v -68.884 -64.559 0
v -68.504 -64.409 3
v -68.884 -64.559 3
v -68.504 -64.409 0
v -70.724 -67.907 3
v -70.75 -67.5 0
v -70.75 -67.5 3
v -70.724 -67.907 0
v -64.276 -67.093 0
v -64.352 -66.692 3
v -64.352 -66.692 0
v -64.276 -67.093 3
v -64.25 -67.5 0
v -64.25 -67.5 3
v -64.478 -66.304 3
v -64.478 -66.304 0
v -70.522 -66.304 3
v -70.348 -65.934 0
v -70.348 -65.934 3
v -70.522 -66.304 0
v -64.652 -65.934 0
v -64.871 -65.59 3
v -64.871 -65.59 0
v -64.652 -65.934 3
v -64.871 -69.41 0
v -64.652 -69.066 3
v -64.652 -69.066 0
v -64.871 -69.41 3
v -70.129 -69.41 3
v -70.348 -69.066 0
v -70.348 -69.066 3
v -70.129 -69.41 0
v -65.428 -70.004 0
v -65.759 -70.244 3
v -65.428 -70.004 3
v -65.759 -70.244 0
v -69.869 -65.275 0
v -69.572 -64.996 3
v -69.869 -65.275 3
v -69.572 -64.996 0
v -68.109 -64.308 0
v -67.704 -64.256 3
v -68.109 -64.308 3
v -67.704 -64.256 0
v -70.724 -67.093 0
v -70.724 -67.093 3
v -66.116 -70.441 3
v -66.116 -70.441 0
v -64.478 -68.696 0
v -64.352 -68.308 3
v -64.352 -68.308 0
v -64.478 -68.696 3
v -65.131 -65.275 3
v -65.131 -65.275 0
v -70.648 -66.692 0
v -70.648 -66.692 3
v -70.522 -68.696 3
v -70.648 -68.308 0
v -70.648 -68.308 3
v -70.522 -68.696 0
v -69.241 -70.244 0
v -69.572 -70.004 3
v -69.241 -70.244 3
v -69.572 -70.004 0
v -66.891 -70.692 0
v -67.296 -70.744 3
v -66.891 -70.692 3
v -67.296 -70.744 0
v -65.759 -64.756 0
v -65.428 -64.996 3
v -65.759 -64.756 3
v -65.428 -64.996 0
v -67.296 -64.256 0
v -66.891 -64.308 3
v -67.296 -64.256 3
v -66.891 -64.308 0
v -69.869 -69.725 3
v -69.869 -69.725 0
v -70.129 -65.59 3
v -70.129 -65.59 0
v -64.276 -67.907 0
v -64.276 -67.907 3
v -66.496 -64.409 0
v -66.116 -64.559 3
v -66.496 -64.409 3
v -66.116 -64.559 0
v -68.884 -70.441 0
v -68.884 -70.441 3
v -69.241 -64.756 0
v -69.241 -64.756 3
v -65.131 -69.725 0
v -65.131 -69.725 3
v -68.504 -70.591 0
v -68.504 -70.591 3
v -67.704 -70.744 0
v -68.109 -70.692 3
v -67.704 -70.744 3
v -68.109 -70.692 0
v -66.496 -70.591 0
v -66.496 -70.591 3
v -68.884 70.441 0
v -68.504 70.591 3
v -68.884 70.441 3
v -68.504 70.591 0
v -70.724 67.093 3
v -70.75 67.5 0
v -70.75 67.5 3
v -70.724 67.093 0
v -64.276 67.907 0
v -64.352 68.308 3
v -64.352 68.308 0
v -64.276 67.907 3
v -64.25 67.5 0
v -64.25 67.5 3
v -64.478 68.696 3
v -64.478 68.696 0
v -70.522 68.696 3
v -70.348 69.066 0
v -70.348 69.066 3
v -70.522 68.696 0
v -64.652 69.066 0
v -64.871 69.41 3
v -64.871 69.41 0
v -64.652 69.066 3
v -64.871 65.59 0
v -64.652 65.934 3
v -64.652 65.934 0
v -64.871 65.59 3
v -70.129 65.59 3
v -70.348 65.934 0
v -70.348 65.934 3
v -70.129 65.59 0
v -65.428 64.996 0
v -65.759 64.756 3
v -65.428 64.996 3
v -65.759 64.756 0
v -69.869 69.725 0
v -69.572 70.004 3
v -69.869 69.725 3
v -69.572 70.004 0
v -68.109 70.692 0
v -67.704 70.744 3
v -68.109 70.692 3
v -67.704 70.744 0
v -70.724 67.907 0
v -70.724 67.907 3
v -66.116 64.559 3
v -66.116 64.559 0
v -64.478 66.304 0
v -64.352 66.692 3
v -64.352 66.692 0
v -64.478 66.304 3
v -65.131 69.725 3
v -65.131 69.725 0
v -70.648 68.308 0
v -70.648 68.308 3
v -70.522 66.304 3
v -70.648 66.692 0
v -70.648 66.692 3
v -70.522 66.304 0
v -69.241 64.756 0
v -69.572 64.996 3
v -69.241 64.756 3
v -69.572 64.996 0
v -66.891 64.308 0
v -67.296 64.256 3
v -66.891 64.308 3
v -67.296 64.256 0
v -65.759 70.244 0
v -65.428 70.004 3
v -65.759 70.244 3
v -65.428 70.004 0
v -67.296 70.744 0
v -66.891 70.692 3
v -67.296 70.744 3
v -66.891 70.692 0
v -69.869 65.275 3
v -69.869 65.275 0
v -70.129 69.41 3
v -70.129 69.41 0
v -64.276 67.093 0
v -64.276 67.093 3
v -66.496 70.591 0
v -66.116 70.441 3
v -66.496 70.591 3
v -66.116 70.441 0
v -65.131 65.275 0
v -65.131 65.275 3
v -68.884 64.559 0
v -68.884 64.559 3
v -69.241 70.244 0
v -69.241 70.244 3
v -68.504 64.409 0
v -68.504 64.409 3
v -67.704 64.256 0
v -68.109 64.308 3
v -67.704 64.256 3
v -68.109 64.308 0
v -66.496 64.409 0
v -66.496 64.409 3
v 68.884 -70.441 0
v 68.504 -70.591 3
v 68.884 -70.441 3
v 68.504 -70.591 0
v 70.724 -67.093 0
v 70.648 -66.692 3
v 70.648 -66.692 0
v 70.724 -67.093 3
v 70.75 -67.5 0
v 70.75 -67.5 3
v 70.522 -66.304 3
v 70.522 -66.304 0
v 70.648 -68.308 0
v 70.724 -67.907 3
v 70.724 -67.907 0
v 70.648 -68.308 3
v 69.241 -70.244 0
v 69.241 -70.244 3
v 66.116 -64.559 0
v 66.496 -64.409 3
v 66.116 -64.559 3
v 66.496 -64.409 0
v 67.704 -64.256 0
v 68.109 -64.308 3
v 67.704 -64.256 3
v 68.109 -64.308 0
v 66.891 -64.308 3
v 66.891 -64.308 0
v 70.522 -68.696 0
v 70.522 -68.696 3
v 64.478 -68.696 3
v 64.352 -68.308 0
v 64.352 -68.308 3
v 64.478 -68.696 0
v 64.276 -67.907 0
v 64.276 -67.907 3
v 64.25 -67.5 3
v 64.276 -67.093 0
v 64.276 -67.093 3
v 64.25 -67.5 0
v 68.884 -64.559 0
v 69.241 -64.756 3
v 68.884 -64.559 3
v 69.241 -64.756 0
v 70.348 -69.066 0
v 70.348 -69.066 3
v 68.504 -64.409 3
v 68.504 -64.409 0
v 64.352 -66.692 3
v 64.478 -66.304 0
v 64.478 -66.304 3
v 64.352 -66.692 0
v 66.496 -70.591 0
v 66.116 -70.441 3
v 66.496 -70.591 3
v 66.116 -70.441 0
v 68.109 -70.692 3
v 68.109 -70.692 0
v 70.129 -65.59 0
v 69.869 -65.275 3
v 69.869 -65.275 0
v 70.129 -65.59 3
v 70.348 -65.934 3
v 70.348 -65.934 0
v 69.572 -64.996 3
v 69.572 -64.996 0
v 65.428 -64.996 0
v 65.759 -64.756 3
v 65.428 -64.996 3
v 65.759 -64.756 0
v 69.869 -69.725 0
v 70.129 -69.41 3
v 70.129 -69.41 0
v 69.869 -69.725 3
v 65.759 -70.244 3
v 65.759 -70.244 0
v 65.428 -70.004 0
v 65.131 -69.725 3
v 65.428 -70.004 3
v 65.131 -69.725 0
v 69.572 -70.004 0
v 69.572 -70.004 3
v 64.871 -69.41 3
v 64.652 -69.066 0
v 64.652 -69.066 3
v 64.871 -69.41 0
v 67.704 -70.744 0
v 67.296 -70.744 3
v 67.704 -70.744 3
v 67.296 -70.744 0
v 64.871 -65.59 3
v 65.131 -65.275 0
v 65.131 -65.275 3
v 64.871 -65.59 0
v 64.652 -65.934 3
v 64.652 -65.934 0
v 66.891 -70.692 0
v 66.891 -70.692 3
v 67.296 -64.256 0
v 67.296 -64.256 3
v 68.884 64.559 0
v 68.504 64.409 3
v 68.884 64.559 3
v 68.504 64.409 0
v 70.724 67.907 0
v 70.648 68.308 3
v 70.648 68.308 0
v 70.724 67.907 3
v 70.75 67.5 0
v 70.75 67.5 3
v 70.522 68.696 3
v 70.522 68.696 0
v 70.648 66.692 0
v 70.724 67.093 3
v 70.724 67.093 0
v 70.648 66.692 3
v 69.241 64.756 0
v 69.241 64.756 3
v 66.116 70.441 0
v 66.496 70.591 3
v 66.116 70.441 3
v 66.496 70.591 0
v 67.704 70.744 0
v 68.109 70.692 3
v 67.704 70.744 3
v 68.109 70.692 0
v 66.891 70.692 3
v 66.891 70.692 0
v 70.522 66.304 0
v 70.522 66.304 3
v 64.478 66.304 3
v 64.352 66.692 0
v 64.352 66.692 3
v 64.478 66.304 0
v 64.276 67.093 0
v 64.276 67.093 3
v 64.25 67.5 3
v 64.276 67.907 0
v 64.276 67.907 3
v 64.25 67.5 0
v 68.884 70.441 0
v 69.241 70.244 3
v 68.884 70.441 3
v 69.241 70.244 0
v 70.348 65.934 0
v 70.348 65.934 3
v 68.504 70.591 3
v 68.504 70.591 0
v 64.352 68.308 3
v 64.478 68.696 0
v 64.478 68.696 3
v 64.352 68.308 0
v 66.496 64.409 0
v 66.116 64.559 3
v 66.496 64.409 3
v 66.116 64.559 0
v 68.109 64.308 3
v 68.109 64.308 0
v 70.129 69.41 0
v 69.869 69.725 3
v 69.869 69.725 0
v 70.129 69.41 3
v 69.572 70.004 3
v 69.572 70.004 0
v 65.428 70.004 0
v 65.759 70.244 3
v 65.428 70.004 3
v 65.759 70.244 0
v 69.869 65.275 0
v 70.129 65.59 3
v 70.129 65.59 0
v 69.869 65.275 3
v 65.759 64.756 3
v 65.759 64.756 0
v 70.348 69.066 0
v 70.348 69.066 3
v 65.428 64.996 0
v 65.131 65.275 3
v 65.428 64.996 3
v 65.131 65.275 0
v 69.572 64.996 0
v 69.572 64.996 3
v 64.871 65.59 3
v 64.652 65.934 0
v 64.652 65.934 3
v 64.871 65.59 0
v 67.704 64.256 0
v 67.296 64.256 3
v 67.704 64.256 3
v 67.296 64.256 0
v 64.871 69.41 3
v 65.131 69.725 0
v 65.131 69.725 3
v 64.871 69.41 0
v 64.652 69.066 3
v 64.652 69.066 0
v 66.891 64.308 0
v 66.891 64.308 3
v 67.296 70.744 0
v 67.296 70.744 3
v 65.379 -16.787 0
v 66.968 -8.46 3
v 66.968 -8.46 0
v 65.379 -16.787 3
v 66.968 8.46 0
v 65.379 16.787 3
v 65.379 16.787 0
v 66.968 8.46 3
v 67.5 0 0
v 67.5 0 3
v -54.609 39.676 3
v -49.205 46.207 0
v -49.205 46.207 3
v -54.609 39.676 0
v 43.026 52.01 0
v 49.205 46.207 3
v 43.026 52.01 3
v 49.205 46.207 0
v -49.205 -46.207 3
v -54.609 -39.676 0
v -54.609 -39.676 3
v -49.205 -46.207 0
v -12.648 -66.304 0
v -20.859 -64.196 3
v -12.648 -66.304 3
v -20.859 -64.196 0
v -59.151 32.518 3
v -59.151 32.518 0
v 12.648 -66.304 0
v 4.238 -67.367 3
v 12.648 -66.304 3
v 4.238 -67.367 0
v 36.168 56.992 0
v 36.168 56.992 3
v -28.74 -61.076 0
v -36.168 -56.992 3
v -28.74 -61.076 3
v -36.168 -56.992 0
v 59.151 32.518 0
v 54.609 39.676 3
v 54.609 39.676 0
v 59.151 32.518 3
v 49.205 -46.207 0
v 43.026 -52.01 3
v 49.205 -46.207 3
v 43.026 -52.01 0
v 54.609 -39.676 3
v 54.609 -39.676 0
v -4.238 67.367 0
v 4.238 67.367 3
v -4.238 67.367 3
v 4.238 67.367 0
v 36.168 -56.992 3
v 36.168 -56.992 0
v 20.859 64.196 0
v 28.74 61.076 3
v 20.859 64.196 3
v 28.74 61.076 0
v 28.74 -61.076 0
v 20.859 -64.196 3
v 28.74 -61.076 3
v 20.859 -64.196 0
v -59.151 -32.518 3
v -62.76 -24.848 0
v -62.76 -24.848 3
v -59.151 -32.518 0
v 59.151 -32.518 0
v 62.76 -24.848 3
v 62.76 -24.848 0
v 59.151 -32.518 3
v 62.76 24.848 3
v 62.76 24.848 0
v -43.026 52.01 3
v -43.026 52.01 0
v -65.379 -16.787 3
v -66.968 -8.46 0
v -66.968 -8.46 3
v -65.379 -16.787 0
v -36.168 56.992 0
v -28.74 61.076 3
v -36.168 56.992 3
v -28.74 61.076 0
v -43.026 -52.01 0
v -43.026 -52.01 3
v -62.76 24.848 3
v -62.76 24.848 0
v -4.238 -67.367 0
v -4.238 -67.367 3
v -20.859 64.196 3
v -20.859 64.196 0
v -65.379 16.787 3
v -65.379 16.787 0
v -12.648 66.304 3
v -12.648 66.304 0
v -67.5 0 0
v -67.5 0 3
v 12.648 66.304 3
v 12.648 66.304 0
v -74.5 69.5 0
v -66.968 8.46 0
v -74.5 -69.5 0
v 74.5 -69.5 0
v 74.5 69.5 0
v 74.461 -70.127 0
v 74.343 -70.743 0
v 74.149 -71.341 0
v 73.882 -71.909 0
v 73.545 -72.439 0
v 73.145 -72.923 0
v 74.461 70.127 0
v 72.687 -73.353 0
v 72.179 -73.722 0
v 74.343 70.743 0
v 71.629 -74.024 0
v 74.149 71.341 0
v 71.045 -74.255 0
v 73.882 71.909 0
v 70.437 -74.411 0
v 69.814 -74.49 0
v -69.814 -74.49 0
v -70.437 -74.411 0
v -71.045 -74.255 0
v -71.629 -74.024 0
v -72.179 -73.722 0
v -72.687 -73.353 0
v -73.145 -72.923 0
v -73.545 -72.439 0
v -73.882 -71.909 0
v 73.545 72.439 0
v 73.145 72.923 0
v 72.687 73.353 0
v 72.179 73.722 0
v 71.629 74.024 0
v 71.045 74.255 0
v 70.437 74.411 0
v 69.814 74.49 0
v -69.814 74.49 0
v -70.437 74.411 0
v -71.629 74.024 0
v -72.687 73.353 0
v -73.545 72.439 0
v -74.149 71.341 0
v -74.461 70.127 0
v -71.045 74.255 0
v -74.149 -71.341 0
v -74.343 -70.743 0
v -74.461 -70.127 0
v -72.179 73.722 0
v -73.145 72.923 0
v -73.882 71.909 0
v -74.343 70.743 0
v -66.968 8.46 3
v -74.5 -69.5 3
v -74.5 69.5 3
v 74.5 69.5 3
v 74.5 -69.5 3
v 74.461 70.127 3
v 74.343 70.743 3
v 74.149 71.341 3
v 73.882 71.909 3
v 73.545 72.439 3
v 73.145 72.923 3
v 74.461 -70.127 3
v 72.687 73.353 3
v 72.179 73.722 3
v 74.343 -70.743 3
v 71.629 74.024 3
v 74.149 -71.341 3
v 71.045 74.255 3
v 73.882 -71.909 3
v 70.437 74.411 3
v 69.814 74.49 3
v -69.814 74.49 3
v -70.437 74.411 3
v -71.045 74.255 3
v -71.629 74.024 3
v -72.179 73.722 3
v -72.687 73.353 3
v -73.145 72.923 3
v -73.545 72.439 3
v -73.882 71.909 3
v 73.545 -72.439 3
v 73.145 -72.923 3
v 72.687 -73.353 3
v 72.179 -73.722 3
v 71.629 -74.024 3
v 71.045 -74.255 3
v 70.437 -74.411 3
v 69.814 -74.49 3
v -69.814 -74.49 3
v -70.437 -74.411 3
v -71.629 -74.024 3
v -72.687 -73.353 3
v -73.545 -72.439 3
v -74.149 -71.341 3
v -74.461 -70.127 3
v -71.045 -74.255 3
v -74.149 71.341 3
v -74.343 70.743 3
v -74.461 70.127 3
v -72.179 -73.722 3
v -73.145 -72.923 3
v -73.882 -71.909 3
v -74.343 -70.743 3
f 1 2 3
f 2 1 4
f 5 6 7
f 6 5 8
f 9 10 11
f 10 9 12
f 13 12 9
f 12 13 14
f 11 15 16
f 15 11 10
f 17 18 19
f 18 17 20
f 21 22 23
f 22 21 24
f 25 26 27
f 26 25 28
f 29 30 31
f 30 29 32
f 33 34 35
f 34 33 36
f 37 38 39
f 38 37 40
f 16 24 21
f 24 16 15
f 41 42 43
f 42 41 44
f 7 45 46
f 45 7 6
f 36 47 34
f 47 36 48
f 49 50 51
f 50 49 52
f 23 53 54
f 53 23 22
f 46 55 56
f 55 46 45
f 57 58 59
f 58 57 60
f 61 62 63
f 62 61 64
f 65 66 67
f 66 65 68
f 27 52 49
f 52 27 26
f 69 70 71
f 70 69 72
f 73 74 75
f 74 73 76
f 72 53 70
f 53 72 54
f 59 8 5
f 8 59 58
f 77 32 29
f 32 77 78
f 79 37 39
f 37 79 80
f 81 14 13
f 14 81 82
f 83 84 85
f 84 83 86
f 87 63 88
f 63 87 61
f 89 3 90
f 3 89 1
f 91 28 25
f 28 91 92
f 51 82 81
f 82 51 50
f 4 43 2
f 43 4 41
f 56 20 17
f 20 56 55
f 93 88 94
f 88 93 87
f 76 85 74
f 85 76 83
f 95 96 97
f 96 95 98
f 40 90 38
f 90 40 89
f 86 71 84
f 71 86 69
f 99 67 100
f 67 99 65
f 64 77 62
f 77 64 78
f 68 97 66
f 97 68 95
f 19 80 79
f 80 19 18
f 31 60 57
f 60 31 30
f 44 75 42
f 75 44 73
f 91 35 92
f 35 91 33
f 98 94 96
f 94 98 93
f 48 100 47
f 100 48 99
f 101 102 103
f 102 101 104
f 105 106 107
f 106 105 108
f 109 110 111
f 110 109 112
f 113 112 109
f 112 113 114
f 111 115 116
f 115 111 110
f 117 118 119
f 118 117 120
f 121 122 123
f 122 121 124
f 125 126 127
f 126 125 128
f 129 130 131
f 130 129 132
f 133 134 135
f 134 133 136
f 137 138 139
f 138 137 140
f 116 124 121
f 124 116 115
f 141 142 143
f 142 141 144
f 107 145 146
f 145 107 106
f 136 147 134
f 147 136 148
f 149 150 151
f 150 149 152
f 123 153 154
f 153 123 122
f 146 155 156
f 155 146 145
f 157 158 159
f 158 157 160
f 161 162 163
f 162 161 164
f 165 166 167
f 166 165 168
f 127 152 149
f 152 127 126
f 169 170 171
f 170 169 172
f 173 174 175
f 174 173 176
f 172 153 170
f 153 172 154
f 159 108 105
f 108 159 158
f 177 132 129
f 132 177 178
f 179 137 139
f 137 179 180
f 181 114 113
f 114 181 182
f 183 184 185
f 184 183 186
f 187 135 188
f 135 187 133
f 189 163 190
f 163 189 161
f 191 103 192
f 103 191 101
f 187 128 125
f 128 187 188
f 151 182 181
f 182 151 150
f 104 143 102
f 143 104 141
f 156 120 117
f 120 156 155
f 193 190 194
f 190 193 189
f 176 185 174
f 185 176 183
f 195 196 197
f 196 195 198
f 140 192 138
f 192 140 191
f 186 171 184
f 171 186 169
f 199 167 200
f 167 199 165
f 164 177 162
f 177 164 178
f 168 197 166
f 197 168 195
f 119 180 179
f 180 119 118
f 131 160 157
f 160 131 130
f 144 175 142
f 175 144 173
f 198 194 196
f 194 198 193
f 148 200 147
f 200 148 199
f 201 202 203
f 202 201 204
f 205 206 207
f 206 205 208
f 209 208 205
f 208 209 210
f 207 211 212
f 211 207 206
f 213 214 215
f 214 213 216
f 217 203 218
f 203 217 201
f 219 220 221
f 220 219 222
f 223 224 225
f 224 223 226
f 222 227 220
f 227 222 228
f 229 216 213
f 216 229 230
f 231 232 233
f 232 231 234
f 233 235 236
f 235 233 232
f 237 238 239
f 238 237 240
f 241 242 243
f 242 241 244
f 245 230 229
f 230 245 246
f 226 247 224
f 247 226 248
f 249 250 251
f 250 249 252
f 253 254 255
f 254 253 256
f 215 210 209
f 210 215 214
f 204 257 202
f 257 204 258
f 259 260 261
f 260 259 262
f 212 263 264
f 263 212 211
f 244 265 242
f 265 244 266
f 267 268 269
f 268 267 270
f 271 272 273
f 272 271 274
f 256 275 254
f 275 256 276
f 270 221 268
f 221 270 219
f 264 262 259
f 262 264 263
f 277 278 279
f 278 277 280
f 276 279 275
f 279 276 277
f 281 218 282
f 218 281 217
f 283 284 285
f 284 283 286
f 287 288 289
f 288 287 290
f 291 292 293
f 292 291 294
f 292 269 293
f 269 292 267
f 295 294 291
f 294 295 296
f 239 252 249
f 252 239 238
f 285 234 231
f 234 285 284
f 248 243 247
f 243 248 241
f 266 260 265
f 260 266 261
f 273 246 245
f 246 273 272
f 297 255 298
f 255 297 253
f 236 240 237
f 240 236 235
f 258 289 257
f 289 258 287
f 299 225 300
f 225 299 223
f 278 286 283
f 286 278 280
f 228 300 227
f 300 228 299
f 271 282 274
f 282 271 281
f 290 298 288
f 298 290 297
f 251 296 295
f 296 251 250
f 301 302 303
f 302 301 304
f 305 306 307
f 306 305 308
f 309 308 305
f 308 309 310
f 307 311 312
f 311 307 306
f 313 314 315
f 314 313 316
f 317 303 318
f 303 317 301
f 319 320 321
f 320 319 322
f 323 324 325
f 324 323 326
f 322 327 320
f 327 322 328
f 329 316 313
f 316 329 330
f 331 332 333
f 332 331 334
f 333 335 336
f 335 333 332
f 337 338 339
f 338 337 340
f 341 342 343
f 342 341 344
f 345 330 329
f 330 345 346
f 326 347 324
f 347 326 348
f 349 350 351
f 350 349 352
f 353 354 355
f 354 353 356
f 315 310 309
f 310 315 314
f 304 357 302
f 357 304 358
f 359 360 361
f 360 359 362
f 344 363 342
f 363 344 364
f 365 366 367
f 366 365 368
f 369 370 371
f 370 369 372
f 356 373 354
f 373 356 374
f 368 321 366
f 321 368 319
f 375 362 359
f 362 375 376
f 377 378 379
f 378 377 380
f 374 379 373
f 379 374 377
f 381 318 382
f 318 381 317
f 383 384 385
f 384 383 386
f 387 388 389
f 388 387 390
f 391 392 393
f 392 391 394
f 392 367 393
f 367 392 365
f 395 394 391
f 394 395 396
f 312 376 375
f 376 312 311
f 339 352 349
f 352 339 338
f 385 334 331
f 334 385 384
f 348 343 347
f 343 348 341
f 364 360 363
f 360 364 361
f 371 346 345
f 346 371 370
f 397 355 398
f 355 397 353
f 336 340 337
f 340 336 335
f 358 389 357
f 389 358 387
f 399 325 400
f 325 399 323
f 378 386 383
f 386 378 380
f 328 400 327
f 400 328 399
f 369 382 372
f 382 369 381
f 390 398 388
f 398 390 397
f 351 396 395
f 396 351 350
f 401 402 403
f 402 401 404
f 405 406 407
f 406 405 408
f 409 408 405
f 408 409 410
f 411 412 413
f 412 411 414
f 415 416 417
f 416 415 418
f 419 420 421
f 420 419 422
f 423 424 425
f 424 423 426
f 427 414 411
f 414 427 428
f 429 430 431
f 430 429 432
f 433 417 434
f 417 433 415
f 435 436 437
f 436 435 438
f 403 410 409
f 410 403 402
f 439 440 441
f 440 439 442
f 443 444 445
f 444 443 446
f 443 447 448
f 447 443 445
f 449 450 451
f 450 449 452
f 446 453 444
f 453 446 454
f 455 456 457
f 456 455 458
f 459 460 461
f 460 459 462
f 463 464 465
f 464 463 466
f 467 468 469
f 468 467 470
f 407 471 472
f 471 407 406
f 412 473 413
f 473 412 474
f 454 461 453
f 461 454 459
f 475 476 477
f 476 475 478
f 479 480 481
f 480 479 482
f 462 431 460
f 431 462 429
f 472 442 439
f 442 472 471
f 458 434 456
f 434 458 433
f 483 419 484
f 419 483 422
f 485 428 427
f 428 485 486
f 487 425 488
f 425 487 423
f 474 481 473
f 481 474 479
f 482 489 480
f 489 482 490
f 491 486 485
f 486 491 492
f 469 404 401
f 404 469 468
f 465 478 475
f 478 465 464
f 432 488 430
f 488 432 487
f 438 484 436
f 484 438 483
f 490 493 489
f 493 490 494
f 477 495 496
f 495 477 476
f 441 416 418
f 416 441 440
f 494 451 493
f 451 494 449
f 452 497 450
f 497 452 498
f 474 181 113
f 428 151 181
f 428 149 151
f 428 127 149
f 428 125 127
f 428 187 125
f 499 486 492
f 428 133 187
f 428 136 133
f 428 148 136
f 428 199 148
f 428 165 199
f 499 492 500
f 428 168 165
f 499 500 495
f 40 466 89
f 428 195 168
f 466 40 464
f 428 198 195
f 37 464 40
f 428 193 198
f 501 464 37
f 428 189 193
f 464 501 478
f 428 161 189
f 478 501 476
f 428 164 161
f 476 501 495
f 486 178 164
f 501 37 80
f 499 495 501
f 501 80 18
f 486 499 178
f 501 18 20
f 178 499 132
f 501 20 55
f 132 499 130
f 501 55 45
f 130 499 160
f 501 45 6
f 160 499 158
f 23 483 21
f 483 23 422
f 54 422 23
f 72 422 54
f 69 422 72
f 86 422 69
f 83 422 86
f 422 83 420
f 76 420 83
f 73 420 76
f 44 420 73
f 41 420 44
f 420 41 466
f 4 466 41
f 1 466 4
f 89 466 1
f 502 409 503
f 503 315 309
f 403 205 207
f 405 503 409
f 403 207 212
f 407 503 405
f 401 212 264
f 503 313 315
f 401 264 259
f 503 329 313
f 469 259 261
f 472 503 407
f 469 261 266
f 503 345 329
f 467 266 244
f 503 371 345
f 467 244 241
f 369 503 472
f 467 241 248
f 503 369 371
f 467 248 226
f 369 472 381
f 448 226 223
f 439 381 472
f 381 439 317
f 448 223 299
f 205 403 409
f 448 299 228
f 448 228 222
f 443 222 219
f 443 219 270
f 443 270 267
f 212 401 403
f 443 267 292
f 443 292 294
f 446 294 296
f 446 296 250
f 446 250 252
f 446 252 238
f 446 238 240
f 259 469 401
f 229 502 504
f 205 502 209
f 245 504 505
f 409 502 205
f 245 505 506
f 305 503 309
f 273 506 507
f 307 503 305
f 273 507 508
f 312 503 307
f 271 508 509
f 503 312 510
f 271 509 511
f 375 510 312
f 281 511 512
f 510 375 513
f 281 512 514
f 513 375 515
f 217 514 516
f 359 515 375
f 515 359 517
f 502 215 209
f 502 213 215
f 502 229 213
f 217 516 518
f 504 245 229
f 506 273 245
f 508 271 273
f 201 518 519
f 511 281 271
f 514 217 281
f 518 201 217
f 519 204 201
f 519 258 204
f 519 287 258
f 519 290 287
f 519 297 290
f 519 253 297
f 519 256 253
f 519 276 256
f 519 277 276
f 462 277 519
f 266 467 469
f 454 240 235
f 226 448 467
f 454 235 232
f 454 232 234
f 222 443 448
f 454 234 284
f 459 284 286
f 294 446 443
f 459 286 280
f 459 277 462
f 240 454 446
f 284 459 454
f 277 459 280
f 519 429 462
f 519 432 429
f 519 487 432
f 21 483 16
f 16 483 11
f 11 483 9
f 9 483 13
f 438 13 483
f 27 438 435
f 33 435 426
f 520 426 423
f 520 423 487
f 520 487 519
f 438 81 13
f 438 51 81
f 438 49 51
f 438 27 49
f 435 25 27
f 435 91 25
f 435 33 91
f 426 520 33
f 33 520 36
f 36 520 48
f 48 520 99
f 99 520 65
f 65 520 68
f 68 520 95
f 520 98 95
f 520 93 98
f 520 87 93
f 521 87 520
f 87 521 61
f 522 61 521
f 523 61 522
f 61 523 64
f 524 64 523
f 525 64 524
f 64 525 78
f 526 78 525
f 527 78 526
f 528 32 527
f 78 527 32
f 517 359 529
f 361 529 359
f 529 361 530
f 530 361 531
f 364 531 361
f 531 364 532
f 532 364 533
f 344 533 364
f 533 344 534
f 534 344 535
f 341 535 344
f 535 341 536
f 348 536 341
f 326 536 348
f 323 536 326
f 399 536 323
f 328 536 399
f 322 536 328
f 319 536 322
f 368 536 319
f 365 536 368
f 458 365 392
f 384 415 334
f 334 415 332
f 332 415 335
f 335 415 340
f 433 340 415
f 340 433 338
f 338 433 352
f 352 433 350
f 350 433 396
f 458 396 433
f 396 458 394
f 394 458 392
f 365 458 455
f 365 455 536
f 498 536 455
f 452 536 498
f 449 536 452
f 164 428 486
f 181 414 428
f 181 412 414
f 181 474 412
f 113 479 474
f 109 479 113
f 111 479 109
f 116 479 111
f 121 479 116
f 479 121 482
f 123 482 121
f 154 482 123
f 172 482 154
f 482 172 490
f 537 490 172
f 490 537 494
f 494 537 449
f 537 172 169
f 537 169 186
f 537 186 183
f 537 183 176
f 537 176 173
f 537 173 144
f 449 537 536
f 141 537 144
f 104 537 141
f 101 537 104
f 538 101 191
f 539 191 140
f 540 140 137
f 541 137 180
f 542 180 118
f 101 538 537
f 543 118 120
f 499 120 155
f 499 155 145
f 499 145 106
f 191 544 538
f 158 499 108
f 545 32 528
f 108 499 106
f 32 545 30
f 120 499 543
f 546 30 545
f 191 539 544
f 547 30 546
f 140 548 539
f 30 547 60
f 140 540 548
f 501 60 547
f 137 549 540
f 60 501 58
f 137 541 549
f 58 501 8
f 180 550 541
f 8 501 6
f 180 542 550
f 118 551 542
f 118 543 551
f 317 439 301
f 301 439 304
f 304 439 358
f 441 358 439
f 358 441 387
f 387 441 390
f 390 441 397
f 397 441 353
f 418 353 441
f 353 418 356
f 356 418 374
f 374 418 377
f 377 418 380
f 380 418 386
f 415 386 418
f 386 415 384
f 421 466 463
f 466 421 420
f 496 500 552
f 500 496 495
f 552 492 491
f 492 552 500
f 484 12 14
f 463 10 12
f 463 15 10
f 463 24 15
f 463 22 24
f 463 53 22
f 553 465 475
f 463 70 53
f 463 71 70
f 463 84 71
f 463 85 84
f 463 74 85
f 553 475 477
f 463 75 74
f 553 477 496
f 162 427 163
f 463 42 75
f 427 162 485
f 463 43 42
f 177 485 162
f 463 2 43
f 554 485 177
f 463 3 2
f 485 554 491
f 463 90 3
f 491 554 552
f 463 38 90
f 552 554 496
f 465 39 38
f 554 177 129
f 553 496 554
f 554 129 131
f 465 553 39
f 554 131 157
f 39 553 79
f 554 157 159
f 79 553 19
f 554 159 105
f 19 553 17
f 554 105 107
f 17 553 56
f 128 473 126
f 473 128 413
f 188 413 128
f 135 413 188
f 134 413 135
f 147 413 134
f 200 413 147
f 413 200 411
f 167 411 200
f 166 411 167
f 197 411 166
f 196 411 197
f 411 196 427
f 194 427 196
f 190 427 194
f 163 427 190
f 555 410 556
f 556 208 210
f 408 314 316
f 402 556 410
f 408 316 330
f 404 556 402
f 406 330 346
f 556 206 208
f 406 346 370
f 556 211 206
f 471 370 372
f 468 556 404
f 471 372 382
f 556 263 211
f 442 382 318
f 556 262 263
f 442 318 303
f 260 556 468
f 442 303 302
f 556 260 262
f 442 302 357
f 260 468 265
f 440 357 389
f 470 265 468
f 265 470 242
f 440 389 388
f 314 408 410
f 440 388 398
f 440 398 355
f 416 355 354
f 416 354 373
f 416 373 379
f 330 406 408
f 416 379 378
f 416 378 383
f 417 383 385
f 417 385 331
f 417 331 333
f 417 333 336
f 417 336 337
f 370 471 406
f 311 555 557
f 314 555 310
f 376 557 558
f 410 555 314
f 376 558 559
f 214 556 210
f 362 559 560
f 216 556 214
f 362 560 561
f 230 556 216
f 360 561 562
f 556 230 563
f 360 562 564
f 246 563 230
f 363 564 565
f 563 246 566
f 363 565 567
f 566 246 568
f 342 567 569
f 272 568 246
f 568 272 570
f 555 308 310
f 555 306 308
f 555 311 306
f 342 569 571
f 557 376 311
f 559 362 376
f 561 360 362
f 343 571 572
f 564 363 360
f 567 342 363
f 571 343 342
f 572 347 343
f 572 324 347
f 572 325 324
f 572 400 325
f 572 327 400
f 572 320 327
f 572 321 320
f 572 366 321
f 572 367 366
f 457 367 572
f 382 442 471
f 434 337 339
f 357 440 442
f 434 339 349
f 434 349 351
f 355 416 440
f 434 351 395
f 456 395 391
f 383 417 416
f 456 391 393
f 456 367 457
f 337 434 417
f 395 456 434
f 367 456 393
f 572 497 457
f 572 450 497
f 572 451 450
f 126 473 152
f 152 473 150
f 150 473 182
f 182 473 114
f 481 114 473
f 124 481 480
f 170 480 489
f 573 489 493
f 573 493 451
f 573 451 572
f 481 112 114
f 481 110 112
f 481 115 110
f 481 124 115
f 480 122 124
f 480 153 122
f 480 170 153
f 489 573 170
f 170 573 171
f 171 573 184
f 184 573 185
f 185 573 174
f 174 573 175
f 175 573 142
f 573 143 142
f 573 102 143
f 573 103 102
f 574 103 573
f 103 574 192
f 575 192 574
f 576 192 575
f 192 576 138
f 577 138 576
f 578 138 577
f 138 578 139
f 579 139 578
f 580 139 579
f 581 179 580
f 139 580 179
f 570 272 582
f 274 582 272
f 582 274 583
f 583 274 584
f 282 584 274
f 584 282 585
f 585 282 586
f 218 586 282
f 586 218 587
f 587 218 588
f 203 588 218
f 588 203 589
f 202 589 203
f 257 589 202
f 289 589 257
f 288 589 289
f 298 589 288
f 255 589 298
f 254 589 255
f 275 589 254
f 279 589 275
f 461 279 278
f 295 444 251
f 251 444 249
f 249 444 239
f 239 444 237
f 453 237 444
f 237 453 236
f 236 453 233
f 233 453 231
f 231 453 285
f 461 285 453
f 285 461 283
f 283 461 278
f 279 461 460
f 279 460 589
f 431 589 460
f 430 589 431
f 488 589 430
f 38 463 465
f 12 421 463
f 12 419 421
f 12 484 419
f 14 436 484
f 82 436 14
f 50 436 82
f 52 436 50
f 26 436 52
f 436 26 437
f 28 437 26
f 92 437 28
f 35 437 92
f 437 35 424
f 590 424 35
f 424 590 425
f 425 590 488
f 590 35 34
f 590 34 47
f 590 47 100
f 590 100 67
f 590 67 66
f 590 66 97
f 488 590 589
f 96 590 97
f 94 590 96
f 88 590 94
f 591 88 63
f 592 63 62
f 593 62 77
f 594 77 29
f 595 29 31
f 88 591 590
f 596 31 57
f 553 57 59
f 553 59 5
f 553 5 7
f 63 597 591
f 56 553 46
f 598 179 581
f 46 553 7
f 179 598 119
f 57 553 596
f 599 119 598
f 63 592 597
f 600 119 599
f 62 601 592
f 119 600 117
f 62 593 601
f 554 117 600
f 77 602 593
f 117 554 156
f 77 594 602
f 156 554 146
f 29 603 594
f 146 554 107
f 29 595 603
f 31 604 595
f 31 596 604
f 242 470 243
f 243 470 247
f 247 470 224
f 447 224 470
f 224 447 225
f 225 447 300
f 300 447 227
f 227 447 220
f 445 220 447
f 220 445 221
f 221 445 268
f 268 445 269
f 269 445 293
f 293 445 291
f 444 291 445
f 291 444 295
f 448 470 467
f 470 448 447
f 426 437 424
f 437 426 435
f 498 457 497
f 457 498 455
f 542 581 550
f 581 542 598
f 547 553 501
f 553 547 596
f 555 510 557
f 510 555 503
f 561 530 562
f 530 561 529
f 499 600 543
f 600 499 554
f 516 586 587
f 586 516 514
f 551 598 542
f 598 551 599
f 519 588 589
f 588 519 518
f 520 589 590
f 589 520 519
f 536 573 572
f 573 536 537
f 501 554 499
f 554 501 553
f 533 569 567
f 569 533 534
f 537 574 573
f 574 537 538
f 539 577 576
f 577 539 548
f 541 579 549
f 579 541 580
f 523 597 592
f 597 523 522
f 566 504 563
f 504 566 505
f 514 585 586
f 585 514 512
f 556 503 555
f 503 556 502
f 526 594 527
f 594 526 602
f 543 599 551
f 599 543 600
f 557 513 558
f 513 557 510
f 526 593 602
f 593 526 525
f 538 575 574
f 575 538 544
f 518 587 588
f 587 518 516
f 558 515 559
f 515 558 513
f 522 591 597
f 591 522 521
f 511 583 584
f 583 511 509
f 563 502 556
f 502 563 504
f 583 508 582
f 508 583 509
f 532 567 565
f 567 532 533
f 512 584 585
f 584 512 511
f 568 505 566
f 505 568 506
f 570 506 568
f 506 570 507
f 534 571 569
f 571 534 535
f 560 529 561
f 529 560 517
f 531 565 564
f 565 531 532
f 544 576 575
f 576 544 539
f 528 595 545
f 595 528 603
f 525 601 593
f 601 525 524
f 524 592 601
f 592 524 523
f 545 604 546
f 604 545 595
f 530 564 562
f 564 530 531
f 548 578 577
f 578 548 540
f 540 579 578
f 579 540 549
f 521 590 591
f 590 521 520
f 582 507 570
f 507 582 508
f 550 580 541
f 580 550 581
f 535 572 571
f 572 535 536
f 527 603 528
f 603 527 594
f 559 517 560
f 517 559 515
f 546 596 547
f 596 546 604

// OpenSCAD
$fn = 50;

difference() {
	union() {
		hull() {
			translate(v = [-69.5, 69.5, 0]) {
				cylinder(h = 3, r = 5);
			}
			translate(v = [69.5, 69.5, 0]) {
				cylinder(h = 3, r = 5);
			}
			translate(v = [-69.5, -69.5, 0]) {
				cylinder(h = 3, r = 5);
			}
			translate(v = [69.5, -69.5, 0]) {
				cylinder(h = 3, r = 5);
			}
		}
	}
	union() {
		translate(v = [-67.5, -67.5, -100.0]) {
			cylinder(h = 200, r = 3.25);
		}
		translate(v = [-67.5, 67.5, -100.0]) {
			cylinder(h = 200, r = 3.25);
		}
		translate(v = [67.5, -67.5, -100.0]) {
			cylinder(h = 200, r = 3.25);
		}
		translate(v = [67.5, 67.5, -100.0]) {
			cylinder(h = 200, r = 3.25);
		}
		translate(v = [-67.5, -67.5, -100.0]) {
			cylinder(h = 200, r = 1.8);
		}
		translate(v = [-67.5, 67.5, -100.0]) {
			cylinder(h = 200, r = 1.8);
		}
		translate(v = [67.5, -67.5, -100.0]) {
			cylinder(h = 200, r = 1.8);
		}
		translate(v = [67.5, 67.5, -100.0]) {
			cylinder(h = 200, r = 1.8);
		}
		cylinder(h = 3, r = 67.5);
	}
}
